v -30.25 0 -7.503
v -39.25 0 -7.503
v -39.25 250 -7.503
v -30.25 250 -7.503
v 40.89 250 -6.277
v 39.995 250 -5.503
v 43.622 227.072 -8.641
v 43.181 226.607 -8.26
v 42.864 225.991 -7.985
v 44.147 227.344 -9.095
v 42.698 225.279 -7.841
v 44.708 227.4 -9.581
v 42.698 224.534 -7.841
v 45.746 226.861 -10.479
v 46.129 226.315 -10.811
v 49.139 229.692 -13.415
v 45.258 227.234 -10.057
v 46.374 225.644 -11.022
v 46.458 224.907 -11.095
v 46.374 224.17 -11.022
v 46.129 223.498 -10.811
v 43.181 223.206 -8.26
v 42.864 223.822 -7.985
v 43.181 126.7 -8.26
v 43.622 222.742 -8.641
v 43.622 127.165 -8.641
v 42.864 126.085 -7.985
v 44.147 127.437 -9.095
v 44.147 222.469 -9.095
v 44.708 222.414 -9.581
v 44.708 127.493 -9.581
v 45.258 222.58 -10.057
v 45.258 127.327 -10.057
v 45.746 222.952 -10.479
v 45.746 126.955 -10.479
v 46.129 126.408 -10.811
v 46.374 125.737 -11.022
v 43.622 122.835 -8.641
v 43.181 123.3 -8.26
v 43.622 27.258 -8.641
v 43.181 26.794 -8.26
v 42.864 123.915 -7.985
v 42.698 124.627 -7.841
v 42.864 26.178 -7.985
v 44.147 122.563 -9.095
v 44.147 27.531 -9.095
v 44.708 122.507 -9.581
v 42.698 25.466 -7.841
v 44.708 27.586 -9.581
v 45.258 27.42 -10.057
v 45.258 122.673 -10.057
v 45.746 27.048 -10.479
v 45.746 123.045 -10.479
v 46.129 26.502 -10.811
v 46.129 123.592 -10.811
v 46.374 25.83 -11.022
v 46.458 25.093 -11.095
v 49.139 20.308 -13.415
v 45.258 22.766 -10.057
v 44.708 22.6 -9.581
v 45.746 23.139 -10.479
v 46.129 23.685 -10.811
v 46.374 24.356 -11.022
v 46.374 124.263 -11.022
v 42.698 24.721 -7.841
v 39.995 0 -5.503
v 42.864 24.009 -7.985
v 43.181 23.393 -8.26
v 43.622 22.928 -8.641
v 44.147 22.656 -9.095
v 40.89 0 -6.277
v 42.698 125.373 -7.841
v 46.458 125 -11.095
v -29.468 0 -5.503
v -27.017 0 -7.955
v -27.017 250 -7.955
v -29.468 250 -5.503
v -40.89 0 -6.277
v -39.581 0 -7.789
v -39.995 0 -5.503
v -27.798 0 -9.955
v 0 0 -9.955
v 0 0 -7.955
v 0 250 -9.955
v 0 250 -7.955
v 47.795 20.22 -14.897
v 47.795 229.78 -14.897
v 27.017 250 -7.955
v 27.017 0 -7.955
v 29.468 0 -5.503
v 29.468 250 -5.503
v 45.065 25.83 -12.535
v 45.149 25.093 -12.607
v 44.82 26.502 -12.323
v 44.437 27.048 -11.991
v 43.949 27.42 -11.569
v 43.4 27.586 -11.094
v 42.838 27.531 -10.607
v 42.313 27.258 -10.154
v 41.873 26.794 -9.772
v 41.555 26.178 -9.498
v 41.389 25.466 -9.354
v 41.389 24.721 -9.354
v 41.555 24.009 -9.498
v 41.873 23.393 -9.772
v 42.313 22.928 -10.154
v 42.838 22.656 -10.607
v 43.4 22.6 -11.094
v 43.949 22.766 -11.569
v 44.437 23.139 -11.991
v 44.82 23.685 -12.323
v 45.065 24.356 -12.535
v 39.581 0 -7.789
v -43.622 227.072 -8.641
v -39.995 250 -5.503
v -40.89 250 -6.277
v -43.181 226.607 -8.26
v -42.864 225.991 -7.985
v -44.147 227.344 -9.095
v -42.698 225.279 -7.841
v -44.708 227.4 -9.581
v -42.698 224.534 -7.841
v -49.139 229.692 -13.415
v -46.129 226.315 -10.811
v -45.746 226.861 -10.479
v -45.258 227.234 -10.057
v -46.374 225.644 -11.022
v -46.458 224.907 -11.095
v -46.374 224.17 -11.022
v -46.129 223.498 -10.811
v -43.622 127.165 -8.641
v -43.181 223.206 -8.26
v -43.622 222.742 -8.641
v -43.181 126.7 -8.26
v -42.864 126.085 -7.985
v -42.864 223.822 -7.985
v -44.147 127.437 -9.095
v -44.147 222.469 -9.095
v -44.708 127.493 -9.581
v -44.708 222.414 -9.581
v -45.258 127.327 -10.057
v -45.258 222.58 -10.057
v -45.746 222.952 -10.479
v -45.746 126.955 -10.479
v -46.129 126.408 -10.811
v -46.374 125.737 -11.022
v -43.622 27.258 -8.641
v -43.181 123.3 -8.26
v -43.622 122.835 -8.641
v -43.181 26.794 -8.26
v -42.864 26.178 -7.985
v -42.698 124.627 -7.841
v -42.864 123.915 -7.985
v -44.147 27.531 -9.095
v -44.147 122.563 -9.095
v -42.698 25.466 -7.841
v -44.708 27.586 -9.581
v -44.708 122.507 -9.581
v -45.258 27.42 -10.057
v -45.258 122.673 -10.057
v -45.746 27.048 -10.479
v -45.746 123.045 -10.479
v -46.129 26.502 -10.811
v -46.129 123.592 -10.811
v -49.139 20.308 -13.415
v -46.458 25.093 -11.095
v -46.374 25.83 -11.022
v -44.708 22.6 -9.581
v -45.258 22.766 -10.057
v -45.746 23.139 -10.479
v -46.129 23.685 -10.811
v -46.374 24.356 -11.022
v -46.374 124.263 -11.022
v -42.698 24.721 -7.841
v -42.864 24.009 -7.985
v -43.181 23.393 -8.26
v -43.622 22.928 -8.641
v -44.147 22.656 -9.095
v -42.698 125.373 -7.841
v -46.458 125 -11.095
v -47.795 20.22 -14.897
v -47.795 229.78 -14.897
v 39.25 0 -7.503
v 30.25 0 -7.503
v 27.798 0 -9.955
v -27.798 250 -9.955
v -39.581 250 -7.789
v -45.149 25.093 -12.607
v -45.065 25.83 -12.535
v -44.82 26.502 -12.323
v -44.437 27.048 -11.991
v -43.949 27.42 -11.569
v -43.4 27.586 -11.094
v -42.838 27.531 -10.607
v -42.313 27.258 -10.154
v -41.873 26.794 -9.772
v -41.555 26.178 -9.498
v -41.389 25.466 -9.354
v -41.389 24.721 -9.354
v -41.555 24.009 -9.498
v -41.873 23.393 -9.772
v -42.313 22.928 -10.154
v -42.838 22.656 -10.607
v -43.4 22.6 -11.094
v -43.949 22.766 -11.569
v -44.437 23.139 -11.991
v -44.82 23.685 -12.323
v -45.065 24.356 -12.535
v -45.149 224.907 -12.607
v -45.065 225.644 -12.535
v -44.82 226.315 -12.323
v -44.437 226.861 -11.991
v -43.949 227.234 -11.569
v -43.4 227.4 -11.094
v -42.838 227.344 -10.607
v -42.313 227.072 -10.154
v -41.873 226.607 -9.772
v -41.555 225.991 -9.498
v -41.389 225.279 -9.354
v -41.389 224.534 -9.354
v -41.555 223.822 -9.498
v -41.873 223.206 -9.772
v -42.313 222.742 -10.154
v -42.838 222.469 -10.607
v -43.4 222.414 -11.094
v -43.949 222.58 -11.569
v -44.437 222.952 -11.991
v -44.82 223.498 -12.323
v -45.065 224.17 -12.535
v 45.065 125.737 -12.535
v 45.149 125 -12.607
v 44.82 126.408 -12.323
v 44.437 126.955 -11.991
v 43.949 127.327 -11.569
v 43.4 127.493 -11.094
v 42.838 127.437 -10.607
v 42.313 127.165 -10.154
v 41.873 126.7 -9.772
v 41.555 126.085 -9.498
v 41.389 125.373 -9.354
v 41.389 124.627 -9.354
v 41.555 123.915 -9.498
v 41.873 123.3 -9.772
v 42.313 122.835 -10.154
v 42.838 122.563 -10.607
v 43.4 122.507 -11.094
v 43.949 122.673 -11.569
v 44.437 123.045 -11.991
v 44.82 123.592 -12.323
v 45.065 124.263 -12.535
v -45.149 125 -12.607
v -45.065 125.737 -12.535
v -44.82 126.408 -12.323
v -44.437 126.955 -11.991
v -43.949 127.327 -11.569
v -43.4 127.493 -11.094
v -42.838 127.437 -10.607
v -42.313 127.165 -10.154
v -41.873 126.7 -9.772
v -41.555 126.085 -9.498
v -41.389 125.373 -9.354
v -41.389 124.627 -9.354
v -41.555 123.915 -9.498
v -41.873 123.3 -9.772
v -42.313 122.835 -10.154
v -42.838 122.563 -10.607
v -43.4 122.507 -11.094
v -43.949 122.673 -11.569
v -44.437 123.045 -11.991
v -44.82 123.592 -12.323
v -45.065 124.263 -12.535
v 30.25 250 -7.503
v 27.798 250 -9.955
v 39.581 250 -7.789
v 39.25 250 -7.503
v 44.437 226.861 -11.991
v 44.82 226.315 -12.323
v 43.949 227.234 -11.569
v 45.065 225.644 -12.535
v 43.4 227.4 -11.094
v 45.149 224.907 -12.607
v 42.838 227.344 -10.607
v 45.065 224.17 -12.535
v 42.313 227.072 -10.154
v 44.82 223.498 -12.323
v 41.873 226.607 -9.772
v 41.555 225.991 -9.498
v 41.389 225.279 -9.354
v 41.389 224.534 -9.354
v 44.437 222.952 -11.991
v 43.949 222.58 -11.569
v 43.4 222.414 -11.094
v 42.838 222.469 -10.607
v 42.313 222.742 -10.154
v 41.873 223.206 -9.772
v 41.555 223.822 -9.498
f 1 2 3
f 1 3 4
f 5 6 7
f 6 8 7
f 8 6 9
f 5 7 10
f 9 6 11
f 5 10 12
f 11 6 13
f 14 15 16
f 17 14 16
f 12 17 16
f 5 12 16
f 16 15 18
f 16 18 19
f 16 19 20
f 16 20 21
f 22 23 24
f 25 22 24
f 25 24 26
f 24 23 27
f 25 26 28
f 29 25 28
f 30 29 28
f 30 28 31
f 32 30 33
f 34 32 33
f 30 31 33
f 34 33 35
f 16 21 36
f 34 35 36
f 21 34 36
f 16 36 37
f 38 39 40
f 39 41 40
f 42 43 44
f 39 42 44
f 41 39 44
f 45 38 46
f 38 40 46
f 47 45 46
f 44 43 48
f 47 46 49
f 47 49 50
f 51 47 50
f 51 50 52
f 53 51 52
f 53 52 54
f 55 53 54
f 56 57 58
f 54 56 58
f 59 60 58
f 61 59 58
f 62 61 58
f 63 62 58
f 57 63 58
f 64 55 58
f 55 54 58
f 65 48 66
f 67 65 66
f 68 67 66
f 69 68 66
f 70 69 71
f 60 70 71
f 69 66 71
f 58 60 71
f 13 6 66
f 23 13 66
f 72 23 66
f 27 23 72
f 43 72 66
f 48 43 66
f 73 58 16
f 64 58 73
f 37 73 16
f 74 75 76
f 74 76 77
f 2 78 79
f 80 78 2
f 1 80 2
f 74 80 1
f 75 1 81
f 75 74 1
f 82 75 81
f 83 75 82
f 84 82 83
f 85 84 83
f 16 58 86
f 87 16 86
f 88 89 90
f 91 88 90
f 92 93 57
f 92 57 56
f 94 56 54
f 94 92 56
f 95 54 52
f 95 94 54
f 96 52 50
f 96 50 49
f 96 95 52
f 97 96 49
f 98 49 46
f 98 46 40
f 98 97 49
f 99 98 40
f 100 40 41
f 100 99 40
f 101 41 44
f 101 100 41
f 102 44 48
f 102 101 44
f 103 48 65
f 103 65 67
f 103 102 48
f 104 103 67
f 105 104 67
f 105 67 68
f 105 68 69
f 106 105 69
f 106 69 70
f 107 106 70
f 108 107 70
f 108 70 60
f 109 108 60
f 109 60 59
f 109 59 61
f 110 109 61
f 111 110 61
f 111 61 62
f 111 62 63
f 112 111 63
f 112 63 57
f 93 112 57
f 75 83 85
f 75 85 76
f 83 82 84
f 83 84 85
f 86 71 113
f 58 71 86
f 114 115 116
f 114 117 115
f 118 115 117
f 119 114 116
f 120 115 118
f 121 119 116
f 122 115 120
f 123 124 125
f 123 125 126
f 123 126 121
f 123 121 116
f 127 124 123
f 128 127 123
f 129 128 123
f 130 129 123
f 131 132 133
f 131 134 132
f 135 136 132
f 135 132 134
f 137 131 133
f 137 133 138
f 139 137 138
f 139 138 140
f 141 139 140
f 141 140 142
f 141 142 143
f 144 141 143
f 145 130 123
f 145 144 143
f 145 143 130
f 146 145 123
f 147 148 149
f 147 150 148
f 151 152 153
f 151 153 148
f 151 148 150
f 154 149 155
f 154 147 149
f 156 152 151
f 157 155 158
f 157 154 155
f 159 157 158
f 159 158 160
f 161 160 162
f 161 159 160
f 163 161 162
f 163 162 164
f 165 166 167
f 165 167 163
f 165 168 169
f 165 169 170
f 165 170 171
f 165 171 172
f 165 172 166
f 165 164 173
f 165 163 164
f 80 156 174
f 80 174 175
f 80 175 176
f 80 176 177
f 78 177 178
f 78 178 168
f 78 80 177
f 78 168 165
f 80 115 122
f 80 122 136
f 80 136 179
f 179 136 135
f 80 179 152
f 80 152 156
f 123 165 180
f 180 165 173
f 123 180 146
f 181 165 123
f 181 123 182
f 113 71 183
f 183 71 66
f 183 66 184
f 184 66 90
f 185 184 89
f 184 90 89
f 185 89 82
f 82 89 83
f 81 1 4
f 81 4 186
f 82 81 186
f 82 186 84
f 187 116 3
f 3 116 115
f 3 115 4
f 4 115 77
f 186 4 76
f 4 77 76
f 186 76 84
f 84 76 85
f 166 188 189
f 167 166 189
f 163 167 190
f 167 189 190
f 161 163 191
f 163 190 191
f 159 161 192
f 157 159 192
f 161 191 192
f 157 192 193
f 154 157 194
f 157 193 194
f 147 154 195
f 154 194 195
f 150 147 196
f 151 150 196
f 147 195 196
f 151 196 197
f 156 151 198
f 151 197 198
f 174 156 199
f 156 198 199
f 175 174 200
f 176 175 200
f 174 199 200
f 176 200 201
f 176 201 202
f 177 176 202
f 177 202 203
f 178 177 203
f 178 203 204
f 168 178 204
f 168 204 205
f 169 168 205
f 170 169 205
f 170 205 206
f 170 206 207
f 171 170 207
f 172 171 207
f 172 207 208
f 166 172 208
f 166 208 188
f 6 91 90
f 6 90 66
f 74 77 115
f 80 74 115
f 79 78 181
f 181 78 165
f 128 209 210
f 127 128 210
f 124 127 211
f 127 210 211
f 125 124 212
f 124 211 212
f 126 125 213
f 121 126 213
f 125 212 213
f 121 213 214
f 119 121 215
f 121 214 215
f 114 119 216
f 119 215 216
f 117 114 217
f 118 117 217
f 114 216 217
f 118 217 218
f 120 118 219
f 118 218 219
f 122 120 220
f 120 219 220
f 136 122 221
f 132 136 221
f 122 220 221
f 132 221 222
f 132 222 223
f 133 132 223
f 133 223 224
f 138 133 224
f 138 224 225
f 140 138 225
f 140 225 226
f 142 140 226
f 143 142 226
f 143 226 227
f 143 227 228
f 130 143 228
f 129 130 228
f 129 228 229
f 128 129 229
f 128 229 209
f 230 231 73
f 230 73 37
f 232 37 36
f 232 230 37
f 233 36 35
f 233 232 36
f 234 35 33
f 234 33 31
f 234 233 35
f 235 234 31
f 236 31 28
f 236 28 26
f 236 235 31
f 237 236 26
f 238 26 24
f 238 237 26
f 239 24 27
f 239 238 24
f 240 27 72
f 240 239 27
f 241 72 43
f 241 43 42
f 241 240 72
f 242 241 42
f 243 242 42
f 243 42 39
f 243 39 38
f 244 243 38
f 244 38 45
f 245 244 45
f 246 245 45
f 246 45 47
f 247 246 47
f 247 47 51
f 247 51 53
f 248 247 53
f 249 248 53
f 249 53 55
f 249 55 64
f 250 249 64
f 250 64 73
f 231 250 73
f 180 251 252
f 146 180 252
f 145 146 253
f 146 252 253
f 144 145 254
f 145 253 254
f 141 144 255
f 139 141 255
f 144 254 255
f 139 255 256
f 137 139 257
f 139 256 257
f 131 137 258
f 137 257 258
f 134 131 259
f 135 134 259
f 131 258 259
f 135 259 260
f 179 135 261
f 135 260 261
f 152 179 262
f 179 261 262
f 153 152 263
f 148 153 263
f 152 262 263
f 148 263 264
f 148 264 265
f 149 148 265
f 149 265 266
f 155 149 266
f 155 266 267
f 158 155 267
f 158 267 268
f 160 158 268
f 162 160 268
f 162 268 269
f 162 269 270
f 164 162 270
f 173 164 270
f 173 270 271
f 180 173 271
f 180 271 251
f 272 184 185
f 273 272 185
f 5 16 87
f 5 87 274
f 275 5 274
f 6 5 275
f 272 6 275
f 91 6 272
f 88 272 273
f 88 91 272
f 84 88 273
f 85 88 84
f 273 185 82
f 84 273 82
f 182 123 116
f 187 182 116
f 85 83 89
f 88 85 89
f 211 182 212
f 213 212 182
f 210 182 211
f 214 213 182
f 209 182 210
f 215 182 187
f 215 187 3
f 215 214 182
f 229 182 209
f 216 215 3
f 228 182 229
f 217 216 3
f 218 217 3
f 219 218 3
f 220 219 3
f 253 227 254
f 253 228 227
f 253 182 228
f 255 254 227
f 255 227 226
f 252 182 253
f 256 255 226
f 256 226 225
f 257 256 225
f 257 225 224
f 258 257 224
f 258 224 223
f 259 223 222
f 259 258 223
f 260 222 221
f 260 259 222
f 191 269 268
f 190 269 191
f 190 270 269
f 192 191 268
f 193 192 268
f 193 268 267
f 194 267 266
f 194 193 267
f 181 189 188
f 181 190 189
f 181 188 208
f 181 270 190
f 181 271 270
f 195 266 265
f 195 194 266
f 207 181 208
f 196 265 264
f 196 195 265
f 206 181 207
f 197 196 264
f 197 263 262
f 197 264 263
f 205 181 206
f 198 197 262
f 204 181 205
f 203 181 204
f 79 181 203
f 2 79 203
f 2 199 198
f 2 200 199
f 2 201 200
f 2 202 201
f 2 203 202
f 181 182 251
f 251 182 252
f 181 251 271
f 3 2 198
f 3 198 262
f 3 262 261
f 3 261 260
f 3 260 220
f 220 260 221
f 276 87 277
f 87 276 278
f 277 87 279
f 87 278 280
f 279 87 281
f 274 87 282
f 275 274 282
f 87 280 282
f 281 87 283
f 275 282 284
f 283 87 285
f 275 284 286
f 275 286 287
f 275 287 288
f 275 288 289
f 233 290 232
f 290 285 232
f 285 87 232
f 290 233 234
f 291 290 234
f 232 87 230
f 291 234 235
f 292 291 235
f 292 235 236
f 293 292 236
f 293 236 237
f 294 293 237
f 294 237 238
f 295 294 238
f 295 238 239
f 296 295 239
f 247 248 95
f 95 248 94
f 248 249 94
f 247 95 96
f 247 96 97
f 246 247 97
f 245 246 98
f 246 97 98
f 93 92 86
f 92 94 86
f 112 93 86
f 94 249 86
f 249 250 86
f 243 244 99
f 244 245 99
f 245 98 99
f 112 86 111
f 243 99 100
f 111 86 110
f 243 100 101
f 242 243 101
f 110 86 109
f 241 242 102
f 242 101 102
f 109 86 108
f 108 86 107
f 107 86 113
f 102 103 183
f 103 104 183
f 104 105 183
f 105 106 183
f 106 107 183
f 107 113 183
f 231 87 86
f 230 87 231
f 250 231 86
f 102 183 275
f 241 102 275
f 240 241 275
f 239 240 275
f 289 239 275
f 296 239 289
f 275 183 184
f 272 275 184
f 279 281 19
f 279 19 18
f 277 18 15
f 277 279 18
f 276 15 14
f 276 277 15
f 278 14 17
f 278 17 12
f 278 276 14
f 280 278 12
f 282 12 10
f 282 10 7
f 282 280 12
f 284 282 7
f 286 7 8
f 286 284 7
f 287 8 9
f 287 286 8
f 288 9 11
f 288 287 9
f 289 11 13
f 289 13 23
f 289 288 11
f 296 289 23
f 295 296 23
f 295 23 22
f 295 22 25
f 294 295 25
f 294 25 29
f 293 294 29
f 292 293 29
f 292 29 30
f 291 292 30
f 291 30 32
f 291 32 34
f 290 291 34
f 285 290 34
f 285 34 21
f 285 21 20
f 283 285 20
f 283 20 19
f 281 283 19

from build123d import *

# Parameters (mm, degrees)
F2_DEPTH = 250
F4_D     = 5
F6_DEPTH = 33.2750494181


with BuildPart() as f2:
    # F0 (on Front) → F2 (new body)
    with BuildSketch(Plane.XZ):
        Polygon((-29.4684734557, -5.5029067088), (-39.995180622, -5.5029067088), (-49.1391739397, -13.415253299), (-47.7946186635, -14.8966111875), (-39.25, -7.5029067088), (-30.25, -7.5029067088), (-27.7983543557, -9.954552353), (0, -9.954552353), (0, -7.954552353), (-27.0168278114, -7.954552353), align=None)
    extrude(amount=-F2_DEPTH)

    # F4 (through all)
    with Locations(Plane(origin=(-14.4015917944, 0, 16.6433633349), x_dir=(0.756198331, 0, 0.6543424823), z_dir=(-0.6543424823, 0, 0.756198331))):
        with Locations((-39.8911029679, 224.9067723751), (-39.8911029679, 125), (-39.8911029679, 25.0932276249)):
            Hole(F4_D / 2)

    # F5 (on face) → F6 (cut, through all)
    with BuildSketch(Plane(origin=(-14.4015917944, 0, 16.6433633349), x_dir=(0.756198331, 0, 0.6543424823), z_dir=(-0.6543424823, 0, 0.756198331))):
        Polygon((-45.9371314651, 229.6921412), (-35.0280794706, 250), (-45.9371314651, 250), align=None)
        Polygon((-35.0280794706, 0), (-45.9371314651, 20.3078588), (-45.9371314651, 0), align=None)
    extrude(amount=-F6_DEPTH, mode=Mode.SUBTRACT)


with BuildPart() as f8_1:
    # F8: instance of F2
    add(f2.part.mirror(Plane(origin=(0, 260, 0), x_dir=(0, 0, 1), z_dir=(-1, 0, 0))))


solid = Compound([f2.part, f8_1.part])
